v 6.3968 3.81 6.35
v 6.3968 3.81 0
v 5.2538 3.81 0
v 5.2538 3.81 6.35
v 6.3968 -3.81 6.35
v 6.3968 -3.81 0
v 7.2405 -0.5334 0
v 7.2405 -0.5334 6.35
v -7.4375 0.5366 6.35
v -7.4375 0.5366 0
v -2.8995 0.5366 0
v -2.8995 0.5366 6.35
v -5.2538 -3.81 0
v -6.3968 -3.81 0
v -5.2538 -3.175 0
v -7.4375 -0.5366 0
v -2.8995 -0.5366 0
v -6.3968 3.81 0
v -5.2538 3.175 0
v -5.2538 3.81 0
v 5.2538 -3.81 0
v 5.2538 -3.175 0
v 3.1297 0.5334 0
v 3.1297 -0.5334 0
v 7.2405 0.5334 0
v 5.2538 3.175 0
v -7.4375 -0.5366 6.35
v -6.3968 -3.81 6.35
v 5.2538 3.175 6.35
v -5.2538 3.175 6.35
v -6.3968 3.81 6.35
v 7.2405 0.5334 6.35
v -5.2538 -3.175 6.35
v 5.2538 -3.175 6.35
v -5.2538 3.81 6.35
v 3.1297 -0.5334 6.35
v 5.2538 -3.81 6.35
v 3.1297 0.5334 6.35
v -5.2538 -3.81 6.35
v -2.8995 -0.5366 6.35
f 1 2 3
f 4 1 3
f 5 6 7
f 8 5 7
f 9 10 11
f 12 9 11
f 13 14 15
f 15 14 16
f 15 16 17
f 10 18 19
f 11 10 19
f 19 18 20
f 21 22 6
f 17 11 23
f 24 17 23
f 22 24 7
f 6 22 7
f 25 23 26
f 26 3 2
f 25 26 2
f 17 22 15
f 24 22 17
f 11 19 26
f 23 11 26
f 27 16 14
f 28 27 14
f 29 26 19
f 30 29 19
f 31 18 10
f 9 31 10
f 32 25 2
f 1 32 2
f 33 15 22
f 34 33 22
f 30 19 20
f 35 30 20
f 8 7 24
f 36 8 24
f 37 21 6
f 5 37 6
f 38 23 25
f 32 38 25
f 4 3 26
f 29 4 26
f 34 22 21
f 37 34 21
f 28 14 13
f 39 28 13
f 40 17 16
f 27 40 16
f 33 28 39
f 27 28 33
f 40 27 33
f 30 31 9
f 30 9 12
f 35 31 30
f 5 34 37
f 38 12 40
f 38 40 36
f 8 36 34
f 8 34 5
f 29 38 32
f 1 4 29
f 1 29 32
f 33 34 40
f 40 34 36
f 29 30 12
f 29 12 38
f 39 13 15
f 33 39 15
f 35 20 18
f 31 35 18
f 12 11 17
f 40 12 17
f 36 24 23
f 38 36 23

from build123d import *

# Parameters (mm, degrees)
F1_DEPTH = 6.35


with BuildPart() as f1:
    # F0 (on Top) → F1 (new body)
    with BuildSketch(Plane.XY):
        Polygon((-2.899504, 0.53663), (-2.899504, 0), (3.129742, 0), (3.129742, 0.5334), (5.253811, 0.5334), (5.253811, 3.175), (-5.253811, 3.175), (-5.253811, 0.53663), align=None)
        Polygon((3.129742, 0), (-2.899504, 0), (-2.899504, -0.53663), (-5.253811, -0.53663), (-5.253811, -3.175), (5.253811, -3.175), (5.253811, -0.5334), (3.129742, -0.5334), align=None)
        Polygon((5.253811, -0.5334), (5.253811, -3.175), (5.253811, -3.81), (6.396811, -3.81), (7.240531, -0.5334), align=None)
        Polygon((5.253811, 3.81), (5.253811, 3.175), (5.253811, 0.5334), (7.240531, 0.5334), (6.396811, 3.81), align=None)
        Polygon((-6.396811, 3.81), (-7.437509, 0.53663), (-5.253811, 0.53663), (-5.253811, 3.175), (-5.253811, 3.81), align=None)
        Polygon((-5.253811, -0.53663), (-7.437509, -0.53663), (-6.396811, -3.81), (-5.253811, -3.81), (-5.253811, -3.175), align=None)
    extrude(amount=F1_DEPTH)


solid = f1.part
